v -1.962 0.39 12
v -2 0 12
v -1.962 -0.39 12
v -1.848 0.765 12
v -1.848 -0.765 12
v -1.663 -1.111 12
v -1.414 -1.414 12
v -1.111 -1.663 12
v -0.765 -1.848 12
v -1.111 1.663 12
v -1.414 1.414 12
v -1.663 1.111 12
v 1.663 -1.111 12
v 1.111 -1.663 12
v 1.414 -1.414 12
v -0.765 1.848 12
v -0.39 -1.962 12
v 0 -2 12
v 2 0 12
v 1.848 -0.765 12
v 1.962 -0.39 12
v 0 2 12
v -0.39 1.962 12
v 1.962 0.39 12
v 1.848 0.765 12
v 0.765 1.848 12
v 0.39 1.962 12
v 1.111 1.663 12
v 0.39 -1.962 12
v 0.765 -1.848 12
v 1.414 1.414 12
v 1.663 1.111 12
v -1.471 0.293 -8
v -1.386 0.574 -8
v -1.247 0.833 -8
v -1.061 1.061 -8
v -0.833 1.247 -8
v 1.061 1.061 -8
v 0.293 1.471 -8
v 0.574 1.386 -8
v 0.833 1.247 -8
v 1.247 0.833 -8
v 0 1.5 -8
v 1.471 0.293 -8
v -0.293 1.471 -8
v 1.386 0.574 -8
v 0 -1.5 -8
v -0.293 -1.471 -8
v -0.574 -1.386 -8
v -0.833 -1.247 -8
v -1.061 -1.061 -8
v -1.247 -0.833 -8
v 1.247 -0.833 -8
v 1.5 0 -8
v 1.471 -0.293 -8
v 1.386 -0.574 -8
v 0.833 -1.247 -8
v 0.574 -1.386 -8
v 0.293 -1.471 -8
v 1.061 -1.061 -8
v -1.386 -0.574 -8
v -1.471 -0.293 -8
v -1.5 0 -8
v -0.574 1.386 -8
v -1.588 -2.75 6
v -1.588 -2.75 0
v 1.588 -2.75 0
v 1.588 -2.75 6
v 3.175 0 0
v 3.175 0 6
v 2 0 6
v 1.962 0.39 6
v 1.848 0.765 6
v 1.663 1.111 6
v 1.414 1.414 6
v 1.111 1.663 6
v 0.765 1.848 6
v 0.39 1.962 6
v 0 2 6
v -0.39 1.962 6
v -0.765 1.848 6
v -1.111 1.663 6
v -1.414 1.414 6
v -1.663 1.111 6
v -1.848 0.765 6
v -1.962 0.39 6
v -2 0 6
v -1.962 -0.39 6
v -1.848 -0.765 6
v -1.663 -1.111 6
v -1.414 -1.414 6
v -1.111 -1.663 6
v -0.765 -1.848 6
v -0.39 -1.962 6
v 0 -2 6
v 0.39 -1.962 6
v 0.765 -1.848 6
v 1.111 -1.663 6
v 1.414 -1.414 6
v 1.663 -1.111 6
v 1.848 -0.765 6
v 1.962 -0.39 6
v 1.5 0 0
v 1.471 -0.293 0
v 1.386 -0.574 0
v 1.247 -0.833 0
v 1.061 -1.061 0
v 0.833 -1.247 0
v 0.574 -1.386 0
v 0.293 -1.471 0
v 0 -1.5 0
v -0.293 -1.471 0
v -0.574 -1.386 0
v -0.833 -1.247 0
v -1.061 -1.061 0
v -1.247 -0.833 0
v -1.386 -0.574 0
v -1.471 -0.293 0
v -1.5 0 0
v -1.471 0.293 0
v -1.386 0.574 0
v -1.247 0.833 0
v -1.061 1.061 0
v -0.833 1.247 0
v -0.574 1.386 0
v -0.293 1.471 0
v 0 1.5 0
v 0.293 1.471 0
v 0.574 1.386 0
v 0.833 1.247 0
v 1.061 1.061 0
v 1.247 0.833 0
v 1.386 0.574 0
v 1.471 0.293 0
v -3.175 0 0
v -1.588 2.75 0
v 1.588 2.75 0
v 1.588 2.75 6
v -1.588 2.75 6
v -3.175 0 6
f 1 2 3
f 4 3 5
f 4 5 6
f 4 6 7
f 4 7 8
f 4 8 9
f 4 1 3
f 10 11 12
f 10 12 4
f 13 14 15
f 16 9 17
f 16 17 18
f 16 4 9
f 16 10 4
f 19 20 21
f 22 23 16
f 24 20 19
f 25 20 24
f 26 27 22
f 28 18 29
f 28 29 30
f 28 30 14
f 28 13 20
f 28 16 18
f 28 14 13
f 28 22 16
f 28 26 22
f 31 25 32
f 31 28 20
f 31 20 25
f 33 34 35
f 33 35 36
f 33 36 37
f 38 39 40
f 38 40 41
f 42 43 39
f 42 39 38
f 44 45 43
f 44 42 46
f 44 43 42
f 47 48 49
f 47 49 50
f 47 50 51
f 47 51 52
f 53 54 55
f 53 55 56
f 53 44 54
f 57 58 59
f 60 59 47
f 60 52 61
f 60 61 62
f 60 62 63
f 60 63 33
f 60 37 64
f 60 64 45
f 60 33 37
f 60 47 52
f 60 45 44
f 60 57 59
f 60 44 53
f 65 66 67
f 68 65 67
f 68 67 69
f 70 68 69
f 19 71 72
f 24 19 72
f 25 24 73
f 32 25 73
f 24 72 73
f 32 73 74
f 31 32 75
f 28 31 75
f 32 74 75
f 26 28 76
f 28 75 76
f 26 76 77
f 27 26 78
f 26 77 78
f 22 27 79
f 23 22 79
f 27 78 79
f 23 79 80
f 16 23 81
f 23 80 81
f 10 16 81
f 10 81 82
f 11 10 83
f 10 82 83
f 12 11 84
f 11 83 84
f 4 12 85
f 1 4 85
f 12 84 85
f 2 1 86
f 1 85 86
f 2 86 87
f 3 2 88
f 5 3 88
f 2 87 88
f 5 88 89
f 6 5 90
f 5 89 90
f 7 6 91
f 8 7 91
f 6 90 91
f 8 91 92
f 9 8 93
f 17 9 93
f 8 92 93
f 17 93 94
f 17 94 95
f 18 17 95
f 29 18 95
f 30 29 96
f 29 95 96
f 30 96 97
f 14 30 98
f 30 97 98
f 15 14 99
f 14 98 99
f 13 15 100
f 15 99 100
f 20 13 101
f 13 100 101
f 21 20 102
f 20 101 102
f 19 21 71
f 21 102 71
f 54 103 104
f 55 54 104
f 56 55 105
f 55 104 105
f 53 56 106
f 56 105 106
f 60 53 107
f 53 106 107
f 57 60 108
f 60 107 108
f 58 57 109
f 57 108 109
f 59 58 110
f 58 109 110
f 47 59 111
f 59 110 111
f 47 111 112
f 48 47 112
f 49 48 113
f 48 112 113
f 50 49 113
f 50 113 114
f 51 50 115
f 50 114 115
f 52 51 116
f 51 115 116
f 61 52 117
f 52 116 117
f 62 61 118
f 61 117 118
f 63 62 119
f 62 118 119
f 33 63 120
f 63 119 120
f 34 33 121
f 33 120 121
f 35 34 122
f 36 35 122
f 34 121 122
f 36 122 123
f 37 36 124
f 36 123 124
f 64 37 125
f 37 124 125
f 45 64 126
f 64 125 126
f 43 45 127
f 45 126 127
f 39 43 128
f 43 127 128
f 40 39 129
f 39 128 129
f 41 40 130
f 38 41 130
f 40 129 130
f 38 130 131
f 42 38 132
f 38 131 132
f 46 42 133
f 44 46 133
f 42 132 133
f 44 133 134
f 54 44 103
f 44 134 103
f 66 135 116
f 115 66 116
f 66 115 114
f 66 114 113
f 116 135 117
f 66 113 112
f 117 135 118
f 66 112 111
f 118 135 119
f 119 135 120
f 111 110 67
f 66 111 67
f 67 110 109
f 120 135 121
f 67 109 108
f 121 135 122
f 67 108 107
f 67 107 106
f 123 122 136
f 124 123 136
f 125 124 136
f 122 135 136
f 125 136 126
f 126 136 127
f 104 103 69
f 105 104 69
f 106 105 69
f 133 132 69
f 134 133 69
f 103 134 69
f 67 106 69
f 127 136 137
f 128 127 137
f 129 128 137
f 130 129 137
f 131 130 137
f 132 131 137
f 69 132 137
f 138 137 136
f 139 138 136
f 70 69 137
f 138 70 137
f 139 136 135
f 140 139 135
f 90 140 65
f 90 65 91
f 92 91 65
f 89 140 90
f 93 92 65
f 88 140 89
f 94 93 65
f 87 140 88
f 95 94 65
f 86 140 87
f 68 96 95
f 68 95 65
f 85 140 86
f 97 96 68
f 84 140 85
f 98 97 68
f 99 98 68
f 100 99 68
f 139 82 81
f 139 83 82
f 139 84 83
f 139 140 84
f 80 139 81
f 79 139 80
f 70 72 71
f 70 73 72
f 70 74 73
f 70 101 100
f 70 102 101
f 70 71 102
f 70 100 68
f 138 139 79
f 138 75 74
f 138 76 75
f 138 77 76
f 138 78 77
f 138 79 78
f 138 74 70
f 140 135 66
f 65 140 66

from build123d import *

# Parameters (mm, degrees)
EXTRUDE_1_DEPTH = 6
SKETCH_2_R      = 2
EXTRUDE_2_DEPTH = 6
SKETCH_6_R      = 1.5
EXTRUDE_3_DEPTH = 8


with BuildPart() as part:
    # 草图1 → 拉伸1 (new body)
    with BuildSketch(Plane.XY):
        Polygon((1.58771324, -2.75), (3.175426481, 0), (1.58771324, 2.75), (-1.58771324, 2.75), (-3.175426481, 0), (-1.58771324, -2.75), align=None)
    extrude(amount=EXTRUDE_1_DEPTH)

    # 草图2 → 拉伸2 (add)
    with BuildSketch(Plane.XY.offset(6)):
        Circle(SKETCH_2_R)
    extrude(amount=EXTRUDE_2_DEPTH)

    # 草图6 → 拉伸3 (add)
    with BuildSketch(Plane(origin=(0, 0, 0), x_dir=(-1, 0, 0), z_dir=(0, 0, -1))):
        with Locations(Location((0, 0, 0), (0, 0, 180))):
            Circle(SKETCH_6_R)
    extrude(amount=EXTRUDE_3_DEPTH)


solid = part.part
